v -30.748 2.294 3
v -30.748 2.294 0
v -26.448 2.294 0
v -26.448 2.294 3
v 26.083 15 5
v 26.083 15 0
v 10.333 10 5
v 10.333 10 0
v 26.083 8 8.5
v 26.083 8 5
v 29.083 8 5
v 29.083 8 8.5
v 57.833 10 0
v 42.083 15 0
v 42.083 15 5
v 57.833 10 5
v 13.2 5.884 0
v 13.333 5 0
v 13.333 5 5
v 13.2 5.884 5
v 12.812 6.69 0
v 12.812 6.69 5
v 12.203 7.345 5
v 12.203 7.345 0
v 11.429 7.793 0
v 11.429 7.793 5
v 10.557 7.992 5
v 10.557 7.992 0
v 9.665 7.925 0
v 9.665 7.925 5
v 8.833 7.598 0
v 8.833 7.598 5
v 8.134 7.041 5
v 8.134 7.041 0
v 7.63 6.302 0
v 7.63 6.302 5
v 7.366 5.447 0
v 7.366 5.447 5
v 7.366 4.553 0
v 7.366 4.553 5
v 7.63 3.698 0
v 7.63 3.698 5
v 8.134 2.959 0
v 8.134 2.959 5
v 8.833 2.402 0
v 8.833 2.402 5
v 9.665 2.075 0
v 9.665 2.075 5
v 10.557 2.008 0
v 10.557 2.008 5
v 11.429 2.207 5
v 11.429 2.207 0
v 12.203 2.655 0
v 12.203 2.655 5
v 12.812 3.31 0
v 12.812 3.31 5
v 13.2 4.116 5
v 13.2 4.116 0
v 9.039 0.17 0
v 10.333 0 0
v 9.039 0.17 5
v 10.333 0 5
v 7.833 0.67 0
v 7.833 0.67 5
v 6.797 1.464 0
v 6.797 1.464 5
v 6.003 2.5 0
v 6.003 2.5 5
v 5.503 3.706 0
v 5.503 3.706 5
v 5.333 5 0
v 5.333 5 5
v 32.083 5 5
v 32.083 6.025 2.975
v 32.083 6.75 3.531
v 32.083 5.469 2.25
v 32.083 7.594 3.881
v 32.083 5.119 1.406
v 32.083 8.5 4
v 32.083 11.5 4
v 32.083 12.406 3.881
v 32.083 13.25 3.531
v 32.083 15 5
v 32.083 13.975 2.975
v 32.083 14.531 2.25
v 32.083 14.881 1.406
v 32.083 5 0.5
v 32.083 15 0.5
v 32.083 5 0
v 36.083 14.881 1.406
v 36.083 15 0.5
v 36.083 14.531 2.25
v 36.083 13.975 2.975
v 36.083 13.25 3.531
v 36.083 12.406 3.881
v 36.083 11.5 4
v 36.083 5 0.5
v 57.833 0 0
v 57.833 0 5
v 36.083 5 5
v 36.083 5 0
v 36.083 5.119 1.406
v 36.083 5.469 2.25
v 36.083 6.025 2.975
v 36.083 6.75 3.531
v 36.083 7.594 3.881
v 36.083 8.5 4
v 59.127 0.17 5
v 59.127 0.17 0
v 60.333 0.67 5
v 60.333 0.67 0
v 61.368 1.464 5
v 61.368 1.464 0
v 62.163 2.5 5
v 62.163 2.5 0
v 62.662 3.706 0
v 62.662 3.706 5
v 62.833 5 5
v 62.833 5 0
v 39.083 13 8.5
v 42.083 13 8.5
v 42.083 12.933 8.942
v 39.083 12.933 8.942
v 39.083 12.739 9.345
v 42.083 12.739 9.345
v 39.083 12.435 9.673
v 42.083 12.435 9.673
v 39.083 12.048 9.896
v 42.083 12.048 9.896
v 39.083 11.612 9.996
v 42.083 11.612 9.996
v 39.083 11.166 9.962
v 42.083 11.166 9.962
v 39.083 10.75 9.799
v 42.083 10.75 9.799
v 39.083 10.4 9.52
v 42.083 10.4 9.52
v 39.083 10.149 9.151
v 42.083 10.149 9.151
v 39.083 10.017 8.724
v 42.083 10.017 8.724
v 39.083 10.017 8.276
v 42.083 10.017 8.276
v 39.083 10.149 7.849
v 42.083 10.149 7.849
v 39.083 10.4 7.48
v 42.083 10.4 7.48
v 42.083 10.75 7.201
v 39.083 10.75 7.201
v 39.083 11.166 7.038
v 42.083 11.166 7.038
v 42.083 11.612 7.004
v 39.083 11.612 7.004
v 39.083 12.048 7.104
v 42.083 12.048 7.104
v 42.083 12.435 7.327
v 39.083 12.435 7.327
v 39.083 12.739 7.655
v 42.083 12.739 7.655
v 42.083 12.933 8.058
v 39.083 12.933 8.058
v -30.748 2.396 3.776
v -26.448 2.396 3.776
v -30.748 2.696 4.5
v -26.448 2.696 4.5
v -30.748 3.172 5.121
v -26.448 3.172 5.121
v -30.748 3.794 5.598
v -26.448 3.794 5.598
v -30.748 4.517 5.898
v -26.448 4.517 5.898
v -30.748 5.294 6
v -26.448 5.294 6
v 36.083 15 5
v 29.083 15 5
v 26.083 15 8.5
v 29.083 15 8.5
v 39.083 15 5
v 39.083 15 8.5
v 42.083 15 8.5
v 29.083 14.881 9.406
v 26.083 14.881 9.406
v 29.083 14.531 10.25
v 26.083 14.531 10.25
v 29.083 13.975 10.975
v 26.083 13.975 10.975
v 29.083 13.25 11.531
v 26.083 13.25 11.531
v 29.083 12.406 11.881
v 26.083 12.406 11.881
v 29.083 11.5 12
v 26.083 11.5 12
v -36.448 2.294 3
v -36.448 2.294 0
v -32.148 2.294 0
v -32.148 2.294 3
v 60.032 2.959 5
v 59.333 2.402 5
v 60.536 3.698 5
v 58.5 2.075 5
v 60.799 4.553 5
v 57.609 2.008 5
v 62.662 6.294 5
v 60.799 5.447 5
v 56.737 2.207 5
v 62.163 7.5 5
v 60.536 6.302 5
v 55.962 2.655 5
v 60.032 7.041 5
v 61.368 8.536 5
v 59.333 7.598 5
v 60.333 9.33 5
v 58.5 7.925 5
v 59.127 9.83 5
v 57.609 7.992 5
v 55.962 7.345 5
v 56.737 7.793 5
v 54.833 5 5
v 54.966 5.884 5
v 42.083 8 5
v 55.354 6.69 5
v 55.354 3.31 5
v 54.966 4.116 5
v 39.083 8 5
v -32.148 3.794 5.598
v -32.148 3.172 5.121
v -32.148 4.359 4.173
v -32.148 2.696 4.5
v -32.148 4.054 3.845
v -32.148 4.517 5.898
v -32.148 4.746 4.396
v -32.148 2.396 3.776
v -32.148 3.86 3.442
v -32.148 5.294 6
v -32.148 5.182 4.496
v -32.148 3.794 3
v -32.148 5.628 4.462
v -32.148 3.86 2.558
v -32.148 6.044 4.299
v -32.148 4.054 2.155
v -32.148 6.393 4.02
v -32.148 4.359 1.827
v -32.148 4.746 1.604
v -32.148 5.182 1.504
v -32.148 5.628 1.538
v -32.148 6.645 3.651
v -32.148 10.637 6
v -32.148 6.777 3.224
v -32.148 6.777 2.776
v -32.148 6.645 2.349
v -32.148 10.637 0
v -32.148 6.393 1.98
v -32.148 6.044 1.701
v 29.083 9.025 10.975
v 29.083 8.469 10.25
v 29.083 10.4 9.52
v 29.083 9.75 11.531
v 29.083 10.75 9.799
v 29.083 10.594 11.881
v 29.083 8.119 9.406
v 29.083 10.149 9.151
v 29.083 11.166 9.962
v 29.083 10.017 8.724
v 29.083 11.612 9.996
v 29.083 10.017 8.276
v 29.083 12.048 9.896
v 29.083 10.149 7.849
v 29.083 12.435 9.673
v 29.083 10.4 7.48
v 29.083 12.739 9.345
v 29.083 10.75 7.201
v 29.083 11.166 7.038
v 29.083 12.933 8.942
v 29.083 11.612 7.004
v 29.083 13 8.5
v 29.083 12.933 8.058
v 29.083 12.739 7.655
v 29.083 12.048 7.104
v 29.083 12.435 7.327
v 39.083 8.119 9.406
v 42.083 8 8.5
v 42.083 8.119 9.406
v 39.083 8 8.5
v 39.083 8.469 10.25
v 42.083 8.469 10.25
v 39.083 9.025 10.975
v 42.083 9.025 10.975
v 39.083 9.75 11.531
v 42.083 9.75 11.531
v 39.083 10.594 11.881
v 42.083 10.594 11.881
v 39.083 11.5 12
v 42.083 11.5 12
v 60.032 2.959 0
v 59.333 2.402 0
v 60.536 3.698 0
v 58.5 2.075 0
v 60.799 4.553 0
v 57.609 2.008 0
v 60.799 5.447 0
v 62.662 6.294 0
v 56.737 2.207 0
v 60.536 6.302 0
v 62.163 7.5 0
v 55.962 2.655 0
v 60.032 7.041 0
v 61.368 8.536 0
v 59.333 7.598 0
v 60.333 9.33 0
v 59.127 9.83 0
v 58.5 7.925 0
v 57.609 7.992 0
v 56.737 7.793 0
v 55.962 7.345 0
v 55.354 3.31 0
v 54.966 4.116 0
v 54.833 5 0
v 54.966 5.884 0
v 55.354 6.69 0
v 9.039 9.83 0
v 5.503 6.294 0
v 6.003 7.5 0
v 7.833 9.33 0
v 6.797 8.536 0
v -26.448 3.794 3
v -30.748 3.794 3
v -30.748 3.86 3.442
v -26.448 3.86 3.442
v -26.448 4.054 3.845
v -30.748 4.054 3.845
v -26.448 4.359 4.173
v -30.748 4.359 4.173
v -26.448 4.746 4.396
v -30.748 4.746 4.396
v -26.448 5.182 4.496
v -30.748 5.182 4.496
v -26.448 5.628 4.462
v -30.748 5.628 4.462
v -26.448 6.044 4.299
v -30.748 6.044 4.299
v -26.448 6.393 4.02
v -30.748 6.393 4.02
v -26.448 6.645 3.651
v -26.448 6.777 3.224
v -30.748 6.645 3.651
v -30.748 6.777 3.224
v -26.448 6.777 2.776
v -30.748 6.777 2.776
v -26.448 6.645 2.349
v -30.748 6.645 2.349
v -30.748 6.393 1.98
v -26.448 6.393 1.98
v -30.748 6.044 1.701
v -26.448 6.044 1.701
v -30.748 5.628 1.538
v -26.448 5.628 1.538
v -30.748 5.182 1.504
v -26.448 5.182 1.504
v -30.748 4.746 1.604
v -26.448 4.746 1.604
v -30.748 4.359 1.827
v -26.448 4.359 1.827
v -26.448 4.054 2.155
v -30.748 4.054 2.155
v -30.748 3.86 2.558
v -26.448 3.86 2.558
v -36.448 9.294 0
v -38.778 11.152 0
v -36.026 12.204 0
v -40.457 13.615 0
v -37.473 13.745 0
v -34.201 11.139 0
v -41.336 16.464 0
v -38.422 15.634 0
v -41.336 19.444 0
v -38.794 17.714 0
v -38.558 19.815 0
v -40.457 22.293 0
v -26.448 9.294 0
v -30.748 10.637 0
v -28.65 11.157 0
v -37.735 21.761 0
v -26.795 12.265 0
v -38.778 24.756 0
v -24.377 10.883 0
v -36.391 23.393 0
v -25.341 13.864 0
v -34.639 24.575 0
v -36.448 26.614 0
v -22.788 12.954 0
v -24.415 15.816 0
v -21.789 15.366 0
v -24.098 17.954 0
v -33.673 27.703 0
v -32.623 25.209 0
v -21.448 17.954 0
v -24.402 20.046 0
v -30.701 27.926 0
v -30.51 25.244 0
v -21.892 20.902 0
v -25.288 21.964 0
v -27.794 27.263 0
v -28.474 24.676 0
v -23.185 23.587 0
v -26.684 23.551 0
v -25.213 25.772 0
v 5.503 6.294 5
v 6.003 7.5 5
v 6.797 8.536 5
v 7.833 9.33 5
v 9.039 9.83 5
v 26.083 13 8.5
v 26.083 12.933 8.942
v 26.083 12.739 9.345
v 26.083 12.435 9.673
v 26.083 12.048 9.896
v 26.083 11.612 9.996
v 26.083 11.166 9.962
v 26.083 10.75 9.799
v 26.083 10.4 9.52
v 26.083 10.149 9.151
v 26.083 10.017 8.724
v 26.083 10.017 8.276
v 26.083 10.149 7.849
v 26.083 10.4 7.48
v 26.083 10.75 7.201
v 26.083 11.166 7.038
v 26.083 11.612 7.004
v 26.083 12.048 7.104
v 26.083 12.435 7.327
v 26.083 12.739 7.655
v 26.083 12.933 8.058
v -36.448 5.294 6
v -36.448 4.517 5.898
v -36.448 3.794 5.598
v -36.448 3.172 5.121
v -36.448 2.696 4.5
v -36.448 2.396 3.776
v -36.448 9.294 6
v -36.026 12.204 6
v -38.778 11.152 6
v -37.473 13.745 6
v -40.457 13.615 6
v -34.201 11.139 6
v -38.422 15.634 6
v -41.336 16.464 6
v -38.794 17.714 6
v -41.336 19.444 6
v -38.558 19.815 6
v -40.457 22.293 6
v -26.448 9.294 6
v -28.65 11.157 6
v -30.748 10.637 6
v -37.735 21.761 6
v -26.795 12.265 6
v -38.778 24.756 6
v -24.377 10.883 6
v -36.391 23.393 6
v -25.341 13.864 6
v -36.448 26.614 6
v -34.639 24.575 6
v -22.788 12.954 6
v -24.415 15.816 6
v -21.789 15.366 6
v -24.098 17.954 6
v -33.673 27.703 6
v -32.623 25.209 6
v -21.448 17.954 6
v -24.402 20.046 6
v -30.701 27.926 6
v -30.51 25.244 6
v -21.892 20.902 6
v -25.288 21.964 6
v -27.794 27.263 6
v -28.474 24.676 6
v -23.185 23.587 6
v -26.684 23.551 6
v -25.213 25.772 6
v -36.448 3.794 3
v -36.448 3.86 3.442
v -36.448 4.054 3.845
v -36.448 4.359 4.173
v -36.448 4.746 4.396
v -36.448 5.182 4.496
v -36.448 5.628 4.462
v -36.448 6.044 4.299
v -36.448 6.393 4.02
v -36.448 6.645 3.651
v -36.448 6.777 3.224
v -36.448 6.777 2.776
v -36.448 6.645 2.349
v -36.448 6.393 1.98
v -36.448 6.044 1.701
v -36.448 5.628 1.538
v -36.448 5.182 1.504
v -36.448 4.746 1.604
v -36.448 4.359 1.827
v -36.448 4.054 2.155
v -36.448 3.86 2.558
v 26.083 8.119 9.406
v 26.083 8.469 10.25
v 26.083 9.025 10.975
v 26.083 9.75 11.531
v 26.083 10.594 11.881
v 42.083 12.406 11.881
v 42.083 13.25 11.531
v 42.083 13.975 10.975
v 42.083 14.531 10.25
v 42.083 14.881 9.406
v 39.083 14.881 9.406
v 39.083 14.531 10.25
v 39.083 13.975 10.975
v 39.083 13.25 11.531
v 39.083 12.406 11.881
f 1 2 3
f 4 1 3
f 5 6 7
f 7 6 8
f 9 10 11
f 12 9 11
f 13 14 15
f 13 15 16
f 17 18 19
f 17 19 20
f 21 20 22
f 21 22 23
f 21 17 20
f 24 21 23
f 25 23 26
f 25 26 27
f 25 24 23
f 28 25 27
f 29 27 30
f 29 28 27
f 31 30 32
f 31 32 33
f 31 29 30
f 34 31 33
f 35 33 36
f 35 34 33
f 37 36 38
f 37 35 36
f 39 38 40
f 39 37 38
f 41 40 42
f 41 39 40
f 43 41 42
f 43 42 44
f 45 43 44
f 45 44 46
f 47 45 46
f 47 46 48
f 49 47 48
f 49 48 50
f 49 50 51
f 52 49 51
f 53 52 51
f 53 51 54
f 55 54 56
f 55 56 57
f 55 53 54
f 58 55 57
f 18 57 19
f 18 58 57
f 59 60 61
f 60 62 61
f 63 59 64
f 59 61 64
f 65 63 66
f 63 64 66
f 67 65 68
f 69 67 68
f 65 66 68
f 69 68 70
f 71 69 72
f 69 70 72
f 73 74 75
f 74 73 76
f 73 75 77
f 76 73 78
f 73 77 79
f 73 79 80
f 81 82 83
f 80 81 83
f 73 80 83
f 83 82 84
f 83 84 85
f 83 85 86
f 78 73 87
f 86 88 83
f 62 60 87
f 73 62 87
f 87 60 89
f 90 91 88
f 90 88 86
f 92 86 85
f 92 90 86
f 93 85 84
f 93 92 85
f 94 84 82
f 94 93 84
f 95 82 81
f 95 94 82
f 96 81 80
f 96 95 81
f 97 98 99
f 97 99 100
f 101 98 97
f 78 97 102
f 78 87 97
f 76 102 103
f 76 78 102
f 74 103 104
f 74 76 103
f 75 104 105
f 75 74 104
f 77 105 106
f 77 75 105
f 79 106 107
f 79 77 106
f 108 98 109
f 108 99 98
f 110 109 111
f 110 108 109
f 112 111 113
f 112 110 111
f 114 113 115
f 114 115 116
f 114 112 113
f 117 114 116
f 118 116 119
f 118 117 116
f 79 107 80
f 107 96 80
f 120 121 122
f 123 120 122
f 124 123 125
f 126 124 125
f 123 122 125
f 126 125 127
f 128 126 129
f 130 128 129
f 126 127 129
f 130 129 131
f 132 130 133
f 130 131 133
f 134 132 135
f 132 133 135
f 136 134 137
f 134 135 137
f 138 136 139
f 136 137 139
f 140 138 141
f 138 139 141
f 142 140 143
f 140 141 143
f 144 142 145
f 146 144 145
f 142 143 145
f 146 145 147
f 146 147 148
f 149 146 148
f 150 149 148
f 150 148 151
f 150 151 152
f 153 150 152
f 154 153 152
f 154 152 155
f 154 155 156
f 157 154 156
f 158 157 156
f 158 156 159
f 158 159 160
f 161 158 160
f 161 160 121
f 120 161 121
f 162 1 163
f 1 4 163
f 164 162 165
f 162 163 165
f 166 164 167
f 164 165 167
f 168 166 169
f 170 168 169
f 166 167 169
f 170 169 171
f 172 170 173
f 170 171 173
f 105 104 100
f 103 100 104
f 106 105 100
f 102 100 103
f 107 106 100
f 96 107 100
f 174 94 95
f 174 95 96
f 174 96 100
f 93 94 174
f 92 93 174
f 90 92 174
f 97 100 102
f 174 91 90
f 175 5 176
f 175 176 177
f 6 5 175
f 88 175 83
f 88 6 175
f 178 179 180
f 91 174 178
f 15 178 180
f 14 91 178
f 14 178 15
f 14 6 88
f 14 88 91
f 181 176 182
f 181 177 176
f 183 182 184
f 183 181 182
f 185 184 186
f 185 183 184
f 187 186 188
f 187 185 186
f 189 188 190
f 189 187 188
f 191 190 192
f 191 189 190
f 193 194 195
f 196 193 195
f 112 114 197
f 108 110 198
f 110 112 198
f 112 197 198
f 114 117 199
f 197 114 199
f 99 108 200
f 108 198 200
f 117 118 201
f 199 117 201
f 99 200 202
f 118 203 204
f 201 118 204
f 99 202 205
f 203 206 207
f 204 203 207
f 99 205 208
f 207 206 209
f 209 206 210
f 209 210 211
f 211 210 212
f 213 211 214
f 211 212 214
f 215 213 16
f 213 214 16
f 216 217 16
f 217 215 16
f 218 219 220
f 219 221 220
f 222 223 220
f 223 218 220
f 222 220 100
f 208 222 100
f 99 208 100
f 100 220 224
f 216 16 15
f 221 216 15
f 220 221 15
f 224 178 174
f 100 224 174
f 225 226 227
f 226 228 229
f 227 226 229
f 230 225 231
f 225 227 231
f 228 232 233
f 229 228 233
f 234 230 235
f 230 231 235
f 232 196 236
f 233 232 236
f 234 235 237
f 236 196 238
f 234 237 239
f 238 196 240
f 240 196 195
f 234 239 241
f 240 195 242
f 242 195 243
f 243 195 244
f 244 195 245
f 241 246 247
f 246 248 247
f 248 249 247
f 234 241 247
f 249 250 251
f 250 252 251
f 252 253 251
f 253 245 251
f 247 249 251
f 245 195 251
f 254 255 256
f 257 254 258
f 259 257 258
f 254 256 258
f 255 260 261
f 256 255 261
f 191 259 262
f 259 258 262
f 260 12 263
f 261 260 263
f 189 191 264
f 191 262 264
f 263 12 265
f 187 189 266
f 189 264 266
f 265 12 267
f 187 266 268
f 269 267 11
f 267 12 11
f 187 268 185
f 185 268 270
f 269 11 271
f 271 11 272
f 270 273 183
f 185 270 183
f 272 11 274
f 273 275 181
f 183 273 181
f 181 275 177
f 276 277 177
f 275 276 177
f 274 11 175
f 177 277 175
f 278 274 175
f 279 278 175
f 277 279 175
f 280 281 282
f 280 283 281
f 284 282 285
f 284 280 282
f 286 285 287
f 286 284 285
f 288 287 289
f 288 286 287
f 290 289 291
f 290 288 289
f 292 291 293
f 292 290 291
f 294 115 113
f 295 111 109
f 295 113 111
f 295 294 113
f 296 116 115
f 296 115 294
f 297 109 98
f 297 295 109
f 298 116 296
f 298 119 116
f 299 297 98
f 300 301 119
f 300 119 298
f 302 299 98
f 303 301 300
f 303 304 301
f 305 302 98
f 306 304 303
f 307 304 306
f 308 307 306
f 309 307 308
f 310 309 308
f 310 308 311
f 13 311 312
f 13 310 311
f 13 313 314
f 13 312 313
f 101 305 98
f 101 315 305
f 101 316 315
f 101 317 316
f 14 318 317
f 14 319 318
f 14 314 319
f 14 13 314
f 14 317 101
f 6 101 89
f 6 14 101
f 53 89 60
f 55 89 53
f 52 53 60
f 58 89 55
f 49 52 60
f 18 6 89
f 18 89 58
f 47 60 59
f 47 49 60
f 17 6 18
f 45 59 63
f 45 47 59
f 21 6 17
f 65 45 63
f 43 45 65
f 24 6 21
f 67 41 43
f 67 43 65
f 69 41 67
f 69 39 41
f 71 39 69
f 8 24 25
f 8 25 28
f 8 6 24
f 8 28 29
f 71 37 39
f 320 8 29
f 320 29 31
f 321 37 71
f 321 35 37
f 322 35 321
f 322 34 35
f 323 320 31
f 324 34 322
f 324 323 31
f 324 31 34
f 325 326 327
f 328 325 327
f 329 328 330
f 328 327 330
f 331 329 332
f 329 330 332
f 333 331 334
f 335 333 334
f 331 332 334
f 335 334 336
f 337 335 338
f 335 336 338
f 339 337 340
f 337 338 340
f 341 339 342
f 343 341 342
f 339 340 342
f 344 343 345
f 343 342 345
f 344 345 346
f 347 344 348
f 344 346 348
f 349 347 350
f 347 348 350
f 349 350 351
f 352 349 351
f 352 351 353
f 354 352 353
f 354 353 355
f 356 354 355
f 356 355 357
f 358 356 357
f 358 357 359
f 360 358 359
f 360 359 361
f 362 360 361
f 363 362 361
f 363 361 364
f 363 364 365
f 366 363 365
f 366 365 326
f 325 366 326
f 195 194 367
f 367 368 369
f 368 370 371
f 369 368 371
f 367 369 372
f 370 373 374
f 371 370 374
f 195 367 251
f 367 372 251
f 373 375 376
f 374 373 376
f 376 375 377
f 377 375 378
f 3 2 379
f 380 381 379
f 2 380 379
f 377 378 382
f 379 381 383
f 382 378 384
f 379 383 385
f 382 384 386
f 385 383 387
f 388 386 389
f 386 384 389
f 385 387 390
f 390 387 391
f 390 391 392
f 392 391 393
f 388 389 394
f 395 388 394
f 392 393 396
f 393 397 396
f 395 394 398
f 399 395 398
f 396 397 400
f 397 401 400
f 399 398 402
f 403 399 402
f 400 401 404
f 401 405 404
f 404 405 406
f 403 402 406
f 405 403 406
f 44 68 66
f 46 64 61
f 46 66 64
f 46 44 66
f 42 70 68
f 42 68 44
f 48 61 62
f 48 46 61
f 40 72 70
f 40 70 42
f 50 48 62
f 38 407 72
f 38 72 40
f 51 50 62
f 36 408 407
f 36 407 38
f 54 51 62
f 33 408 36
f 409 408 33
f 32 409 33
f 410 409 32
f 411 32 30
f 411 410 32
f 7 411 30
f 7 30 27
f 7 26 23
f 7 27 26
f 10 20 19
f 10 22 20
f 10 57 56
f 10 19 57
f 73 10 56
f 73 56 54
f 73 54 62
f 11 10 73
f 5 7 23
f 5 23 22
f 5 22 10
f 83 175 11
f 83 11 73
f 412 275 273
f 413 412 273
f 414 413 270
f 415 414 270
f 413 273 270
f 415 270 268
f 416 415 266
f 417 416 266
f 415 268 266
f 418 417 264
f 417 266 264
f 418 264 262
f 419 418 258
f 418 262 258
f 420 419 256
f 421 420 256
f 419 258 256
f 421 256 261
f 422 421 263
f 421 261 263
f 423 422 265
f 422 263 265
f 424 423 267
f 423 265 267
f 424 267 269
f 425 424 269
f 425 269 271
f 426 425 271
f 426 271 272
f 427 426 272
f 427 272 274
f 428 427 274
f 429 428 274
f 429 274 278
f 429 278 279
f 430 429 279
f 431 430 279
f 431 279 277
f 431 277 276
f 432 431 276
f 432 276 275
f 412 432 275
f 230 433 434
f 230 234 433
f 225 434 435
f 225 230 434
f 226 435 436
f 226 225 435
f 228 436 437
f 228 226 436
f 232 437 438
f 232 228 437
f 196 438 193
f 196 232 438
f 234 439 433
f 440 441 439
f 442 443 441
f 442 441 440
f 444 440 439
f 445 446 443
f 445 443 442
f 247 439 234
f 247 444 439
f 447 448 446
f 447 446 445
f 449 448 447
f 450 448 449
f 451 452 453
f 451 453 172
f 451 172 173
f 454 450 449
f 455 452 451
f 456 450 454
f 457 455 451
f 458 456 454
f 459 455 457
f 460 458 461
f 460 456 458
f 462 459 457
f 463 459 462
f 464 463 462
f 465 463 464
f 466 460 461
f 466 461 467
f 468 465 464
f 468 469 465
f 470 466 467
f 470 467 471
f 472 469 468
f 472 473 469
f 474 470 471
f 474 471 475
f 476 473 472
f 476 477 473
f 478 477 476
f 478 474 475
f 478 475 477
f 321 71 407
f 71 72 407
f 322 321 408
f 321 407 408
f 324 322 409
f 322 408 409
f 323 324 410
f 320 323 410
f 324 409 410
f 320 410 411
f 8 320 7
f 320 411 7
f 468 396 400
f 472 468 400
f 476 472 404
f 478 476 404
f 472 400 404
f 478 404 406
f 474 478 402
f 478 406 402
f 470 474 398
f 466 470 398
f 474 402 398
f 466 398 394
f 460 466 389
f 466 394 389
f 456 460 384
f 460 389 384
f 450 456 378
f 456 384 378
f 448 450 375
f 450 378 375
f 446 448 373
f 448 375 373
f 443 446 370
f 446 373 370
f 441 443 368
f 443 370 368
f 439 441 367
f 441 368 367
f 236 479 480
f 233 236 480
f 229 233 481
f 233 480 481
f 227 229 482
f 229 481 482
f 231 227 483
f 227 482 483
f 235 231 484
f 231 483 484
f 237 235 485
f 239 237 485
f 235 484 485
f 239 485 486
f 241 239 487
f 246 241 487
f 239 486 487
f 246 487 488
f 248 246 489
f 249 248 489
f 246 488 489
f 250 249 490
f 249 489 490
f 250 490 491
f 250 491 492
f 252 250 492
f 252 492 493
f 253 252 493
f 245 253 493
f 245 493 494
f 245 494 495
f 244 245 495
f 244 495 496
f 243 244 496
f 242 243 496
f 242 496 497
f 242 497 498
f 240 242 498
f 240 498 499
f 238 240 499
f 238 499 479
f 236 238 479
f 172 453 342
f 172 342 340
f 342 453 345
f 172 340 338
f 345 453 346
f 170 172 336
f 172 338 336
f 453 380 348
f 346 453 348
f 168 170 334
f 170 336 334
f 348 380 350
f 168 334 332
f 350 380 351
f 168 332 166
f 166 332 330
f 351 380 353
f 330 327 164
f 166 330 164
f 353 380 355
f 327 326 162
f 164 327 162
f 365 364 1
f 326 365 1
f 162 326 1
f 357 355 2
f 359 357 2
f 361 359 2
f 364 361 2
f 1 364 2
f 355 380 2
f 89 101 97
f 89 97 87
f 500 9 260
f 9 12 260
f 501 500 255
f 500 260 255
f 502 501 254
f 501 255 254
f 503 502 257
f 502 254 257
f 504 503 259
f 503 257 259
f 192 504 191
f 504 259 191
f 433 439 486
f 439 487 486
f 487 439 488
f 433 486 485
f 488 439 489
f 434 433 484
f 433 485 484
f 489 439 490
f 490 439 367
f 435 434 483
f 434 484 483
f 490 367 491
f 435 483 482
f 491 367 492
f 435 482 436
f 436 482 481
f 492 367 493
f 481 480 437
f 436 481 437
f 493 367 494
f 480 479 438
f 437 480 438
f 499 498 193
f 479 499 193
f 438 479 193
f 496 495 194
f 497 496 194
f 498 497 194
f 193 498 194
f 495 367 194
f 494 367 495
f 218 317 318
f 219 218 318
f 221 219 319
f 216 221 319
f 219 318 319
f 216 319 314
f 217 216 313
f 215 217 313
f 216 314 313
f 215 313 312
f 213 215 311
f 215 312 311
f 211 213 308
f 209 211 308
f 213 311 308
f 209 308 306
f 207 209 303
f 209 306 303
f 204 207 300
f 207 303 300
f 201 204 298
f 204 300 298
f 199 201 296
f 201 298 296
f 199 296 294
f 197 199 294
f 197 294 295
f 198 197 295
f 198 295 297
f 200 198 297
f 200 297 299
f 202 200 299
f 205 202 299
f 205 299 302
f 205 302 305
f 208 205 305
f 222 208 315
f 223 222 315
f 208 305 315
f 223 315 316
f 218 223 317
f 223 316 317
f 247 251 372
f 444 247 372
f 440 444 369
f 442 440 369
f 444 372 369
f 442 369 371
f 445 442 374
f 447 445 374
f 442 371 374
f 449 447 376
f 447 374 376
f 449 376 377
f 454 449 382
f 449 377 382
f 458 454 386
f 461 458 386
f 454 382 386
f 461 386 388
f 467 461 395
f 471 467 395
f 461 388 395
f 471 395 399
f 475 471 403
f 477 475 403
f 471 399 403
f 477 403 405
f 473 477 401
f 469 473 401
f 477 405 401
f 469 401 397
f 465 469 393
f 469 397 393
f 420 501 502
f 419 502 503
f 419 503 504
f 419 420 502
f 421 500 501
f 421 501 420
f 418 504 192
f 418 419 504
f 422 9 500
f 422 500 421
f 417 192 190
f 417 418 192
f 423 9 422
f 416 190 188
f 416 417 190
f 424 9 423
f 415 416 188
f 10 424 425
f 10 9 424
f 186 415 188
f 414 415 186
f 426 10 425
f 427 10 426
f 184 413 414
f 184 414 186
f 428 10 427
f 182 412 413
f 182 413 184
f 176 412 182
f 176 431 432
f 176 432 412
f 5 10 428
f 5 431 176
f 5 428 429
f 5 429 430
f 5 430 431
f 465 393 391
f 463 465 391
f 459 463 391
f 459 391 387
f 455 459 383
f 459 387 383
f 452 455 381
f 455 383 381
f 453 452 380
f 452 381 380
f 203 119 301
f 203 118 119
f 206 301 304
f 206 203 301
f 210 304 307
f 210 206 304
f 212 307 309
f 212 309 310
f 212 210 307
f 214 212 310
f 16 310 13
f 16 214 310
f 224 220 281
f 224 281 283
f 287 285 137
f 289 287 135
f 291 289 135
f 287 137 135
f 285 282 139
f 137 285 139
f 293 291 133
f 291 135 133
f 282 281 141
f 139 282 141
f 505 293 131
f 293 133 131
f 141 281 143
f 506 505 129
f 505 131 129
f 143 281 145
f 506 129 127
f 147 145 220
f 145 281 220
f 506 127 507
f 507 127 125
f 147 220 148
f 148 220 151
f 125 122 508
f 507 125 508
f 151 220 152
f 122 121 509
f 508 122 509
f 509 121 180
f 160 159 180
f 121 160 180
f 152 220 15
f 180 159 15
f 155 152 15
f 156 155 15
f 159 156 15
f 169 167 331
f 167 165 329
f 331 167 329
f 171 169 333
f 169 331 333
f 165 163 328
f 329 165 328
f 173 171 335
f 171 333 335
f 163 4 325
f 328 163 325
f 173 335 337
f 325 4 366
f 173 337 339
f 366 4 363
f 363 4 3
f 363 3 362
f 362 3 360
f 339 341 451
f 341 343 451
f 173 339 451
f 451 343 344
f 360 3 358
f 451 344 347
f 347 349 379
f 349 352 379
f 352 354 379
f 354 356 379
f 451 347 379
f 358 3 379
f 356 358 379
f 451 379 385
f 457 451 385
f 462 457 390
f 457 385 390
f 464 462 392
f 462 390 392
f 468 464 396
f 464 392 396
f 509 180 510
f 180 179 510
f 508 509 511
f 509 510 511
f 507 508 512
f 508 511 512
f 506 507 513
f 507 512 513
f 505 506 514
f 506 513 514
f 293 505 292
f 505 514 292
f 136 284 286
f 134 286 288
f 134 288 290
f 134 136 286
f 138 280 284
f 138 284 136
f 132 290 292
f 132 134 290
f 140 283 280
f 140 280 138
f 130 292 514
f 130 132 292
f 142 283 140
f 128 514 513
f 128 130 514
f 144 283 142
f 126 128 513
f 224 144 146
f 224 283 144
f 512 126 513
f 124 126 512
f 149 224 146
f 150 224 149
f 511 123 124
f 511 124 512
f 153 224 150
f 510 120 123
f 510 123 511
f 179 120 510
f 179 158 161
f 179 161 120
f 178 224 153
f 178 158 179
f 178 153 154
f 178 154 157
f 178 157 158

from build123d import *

# Parameters (mm, degrees)
F1_DEPTH = 6
F3_D     = 3
F4_W     = 3
F4_H     = 7
F5_DEPTH = 12
F4_R     = 3
F6_DEPTH = 5
F7_DEPTH = 4
F8_R     = 4.99999
F9_R     = 3.49999
F12_D    = 3
F13_R    = 3


# Not quite as in the source:
# - a fillet or chamfer is up to 0.001 mm smaller than in the source, because OpenCascade refuses the exact size
# - a feature names something its author has since deleted; it is built from what else it names


with BuildPart() as f1:
    # F0 (on Top) → F1 (new body)
    with BuildSketch(Plane.XY):
        with BuildLine():
            ThreePointArc((-26.4478022211, 9.2937625569), (-28.5229179157, 8.3913259797), (-30.7478022211, 7.978546681))
            Line((-30.7478022211, 7.978546681), (-30.7478022211, 2.2937625569))
            Line((-30.7478022211, 2.2937625569), (-26.4478022211, 2.2937625569))
            Line((-26.4478022211, 2.2937625569), (-26.4478022211, 9.2937625569))
        make_face()
        with BuildLine():
            Line((-32.1478022211, 2.2937625569), (-32.1478022211, 7.978546681))
            ThreePointArc((-32.1478022211, 7.978546681), (-34.3726865265, 8.3913259797), (-36.4478022211, 9.2937625569))
            Line((-36.4478022211, 9.2937625569), (-36.4478022211, 2.2937625569))
            Line((-36.4478022211, 2.2937625569), (-32.1478022211, 2.2937625569))
        make_face()
        with BuildLine():
            ThreePointArc((-32.1478022211, 10.6374258586), (-36.3913586332, 23.3931111885), (-24.0978022211, 17.9540165948))
            ThreePointArc((-24.0978022211, 17.9540165948), (-26.0087076273, 13.0104601826), (-30.7478022211, 10.6374258586))
            Line((-30.7478022211, 10.6374258586), (-30.7478022211, 7.978546681))
            ThreePointArc((-30.7478022211, 7.978546681), (-28.5229179157, 8.3913259797), (-26.4478022211, 9.2937625569))
            ThreePointArc((-26.4478022211, 9.2937625569), (-22.7875481833, 12.9540165948), (-21.4478022211, 17.9540165948))
            ThreePointArc((-21.4478022211, 17.9540165948), (-36.4478022211, 26.6142706326), (-36.4478022211, 9.2937625569))
            ThreePointArc((-36.4478022211, 9.2937625569), (-34.3726865265, 8.3913259797), (-32.1478022211, 7.978546681))
            Line((-32.1478022211, 7.978546681), (-32.1478022211, 10.6374258586))
        make_face()
    extrude(amount=F1_DEPTH)

    # F3 (through all)
    with Locations(Plane.YZ.offset(-26.4478022211)):
        with Locations((5.2937625569, 3)):
            Hole(F3_D / 2)

    # F13
    f13_edges = [f1.edges().sort_by_distance(p)[0] for p in [
        (-34.297802, 2.293763, 6),
        (-28.597802, 2.293763, 6),
    ]]
    fillet(f13_edges, radius=F13_R)


with BuildPart() as f5:
    # F4 (on Top) → F5 (new body)
    with BuildSketch(Plane.XY):
        with Locations((27.5828619152, 11.5)):
            Rectangle(F4_W, F4_H)
    extrude(amount=F5_DEPTH)

    # F4 (on Top) → F6 (join)
    with BuildSketch(Plane.XY):
        Polygon((10.3328619152, 10), (5.3328619152, 10), (5.3328619152, 0), (10.3328619152, 0), (32.0828619152, 5), (32.0828619152, 8), (29.0828619152, 8), (26.0828619152, 8), (26.0828619152, 15), align=None)
        with Locations((10.3328619152, 5)):
            Circle(F4_R, mode=Mode.SUBTRACT)
        with Locations((30.5828619152, 11.5)):
            Rectangle(F4_W, F4_H)
    extrude(amount=F6_DEPTH)

    # F4 (on Top) → F7 (join)
    with BuildSketch(Plane.XY):
        Polygon((32.0828619152, 8), (32.0828619152, 5), (34.0828619152, 5), (34.0828619152, 15), (32.0828619152, 15), align=None)
    extrude(amount=F7_DEPTH)

    # F8 (radius 5 in the source; OpenCascade refuses exactly that, so slightly less here)
    f8_edges = [f5.edges().sort_by_distance(p)[0] for p in [
        (5.332862, 0, 2.5),
        (5.332862, 10, 2.5),
    ]]
    fillet(f8_edges, radius=F8_R)

    # F9 (radius 3.5 in the source; OpenCascade refuses exactly that, so slightly less here)
    f9_edges = [f5.edges().sort_by_distance(p)[0] for p in [
        (33.082862, 15, 4),
        (33.082862, 5, 4),
        (27.582862, 15, 12),
        (27.582862, 8, 12),
    ]]
    fillet(f9_edges, radius=F9_R)

    # F11: F5 across face


with BuildPart() as f5_1:
    add(f5.part)
    add(f5.part.mirror(Plane(origin=(34.0828619152, 10, 1.8156418236), x_dir=(0, 1, 0), z_dir=(1, 0, 0))))

    # F12 (through all)
    with Locations(Plane(origin=(26.0828619152, 0, 0), x_dir=(0, -1, 0), z_dir=(-1, 0, 0))):
        with Locations((-11.5, 8.5)):
            Hole(F12_D / 2)


solid = Compound([f1.part, f5_1.part])
